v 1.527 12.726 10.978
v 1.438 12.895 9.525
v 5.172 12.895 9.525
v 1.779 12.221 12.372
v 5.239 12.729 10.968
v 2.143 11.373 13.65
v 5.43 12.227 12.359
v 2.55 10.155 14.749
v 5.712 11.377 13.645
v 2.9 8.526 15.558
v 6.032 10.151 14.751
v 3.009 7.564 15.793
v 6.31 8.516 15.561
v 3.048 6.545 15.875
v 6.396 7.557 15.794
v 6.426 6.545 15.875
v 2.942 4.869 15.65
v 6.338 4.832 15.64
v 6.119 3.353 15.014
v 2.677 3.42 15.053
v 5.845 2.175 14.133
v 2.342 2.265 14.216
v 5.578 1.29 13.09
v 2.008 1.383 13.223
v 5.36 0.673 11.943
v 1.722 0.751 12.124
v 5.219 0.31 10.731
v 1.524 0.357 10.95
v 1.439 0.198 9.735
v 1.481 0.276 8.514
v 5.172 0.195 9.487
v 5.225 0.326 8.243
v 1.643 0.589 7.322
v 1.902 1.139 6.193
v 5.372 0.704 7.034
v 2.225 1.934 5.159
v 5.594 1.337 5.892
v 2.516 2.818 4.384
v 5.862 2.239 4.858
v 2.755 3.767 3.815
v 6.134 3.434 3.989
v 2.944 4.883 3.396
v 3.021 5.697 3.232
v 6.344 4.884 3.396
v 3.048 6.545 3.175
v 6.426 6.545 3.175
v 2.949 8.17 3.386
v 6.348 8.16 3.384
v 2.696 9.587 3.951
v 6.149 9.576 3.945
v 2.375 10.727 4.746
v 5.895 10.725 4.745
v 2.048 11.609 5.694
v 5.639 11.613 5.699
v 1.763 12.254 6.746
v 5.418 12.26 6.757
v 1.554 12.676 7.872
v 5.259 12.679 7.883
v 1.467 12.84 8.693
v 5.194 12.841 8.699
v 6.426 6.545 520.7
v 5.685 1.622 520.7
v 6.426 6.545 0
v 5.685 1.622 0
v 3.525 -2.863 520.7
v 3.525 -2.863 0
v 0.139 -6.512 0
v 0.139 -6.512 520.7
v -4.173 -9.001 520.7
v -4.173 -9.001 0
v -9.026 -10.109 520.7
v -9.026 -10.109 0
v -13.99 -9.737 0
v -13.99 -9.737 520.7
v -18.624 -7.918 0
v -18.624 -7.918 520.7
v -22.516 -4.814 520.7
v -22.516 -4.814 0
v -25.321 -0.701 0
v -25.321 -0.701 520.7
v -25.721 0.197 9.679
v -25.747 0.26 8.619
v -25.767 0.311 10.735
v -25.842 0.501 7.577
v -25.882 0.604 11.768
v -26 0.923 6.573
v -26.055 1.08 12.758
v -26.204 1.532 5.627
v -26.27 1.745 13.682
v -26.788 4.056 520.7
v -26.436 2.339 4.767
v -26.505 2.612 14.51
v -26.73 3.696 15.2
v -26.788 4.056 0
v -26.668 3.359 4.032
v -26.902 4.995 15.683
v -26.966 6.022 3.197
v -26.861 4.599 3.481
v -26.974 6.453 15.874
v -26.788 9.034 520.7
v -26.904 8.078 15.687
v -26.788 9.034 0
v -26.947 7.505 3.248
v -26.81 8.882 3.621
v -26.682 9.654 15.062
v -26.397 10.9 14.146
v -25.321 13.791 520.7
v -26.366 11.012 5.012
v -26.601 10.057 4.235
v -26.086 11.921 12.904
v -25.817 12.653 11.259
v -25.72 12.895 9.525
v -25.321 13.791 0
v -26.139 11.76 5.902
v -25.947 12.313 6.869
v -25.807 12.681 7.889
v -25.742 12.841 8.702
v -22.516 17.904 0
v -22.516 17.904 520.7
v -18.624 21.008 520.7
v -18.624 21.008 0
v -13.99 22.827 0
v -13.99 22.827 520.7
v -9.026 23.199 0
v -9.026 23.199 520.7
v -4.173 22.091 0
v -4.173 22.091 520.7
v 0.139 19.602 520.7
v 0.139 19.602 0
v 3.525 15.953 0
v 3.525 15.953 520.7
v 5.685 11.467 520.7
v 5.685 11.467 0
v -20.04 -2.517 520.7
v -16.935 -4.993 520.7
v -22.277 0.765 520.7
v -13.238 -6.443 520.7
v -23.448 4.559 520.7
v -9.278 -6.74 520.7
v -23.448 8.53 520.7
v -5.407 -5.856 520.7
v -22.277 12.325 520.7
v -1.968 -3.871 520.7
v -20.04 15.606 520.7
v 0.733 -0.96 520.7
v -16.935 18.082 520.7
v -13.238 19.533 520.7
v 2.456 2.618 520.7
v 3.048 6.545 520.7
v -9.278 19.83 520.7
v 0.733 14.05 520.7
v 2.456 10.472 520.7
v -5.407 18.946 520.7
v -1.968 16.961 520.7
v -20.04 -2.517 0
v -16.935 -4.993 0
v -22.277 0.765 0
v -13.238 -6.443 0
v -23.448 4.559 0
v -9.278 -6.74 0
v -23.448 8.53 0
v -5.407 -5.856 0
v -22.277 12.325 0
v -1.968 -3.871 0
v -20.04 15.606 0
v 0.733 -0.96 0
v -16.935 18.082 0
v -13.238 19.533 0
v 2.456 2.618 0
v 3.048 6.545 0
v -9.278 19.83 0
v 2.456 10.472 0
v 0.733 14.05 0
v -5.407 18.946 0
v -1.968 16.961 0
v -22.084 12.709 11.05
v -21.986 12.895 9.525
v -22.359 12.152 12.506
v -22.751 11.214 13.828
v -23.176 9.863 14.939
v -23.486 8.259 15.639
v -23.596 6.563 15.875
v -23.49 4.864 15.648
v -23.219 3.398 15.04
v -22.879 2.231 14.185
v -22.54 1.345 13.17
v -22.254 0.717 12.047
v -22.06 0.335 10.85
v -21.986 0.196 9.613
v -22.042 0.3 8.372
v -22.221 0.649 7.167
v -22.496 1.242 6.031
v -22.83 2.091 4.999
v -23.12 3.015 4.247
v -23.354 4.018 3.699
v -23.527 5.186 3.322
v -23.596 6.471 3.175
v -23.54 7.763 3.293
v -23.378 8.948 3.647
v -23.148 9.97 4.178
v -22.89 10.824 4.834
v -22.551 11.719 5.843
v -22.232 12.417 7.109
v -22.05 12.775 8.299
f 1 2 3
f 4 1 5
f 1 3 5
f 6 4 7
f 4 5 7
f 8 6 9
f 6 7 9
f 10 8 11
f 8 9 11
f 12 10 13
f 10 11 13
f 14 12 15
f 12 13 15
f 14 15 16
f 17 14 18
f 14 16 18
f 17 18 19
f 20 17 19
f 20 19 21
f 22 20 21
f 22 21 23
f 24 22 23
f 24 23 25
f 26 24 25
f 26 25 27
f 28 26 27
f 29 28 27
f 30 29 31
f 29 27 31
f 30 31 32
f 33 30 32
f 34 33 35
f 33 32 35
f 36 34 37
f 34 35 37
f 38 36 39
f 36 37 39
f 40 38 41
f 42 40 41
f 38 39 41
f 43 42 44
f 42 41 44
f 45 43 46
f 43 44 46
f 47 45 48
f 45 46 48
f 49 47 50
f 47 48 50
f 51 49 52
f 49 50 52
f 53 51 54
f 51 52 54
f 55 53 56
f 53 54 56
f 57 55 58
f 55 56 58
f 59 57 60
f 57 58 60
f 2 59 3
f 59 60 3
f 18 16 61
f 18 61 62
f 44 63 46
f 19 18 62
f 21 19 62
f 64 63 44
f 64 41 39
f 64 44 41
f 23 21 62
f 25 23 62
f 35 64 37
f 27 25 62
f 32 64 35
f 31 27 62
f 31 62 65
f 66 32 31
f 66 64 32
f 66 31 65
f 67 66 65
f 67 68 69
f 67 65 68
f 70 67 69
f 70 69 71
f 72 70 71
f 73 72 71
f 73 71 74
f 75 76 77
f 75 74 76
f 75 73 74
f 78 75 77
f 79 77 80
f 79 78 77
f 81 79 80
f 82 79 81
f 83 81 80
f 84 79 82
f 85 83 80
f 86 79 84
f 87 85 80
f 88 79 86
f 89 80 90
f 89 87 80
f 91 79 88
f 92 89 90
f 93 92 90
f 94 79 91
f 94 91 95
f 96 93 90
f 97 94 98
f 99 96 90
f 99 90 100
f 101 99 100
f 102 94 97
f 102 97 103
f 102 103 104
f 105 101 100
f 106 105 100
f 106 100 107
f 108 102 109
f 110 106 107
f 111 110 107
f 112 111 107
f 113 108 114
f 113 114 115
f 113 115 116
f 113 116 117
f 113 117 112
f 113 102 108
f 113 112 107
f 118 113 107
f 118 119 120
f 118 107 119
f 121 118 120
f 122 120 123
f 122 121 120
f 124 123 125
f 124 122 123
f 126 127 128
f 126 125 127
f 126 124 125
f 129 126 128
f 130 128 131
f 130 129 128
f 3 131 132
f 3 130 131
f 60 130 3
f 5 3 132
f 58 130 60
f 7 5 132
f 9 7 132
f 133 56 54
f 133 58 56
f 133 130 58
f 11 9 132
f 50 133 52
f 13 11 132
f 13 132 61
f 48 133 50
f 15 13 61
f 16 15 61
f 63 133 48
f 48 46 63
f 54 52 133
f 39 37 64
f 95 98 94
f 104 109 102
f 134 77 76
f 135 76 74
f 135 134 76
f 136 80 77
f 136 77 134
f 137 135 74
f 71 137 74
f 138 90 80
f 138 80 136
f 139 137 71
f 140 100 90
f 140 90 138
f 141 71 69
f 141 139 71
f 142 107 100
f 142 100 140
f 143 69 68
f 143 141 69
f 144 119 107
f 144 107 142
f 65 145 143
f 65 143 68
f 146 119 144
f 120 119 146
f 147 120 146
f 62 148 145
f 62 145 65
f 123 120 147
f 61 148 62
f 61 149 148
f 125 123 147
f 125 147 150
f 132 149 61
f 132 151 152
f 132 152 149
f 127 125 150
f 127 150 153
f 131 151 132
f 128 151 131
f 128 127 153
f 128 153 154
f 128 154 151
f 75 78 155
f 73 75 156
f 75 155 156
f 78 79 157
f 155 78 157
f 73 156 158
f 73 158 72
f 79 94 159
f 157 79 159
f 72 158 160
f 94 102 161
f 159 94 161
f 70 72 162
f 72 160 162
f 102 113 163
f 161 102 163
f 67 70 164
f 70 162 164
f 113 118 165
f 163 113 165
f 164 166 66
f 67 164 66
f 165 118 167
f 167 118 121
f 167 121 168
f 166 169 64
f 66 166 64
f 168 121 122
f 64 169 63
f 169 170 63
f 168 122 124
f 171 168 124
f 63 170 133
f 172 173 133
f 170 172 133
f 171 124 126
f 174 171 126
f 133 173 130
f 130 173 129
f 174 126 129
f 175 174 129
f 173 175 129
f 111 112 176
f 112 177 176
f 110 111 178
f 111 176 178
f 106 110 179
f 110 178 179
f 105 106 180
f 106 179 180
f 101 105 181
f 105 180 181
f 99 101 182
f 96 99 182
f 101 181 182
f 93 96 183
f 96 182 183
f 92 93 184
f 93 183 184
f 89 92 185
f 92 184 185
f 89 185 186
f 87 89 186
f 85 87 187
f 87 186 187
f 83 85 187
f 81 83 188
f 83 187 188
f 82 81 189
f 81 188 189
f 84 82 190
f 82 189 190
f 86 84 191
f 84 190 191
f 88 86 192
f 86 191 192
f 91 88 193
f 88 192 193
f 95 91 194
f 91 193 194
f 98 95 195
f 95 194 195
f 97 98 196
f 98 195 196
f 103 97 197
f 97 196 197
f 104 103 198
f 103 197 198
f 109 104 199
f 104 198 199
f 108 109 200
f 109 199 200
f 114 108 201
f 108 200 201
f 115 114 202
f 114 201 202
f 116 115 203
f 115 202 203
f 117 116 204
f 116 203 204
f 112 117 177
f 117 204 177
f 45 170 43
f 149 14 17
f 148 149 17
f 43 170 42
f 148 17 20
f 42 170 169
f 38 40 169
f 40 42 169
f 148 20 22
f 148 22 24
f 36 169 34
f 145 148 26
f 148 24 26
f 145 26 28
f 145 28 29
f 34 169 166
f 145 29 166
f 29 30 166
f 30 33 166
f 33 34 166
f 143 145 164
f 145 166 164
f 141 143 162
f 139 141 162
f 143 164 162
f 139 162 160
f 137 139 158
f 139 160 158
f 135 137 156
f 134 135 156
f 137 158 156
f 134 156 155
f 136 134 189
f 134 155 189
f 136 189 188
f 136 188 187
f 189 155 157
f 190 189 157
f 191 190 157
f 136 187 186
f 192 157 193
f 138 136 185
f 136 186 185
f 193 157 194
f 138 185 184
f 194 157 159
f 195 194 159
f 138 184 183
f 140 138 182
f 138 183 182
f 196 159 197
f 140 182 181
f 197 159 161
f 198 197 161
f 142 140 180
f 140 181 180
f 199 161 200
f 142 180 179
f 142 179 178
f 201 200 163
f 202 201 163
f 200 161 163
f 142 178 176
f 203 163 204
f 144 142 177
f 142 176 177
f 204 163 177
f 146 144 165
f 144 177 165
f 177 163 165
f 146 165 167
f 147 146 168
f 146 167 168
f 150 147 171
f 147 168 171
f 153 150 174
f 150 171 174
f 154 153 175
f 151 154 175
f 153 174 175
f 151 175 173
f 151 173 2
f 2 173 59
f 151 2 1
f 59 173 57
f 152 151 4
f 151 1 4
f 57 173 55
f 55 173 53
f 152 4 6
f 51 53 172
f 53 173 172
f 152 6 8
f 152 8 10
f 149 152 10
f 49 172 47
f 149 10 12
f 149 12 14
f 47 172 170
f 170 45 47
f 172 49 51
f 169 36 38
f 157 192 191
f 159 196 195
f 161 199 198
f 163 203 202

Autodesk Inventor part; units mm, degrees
ref_plane "XZ Plane" through (0, 0, 0) normal (0, 1, 0) x (-1, 0, 0)
ref_plane "XY Plane" through (0, 0, 0) normal (0, 0, 1) x (1, 0, 0)
sketch "Sketch1" plane through (0, 0, 0) normal (0, 0, 1) x (1, 0, 0)
  circle A0 centre (-10.274, 6.5449) radius 16.7005
  dimension "d0" = 33.401
extrude "Extrusion1" add sketch "Sketch1" along normal blind 520.7
shell "Shell1" thickness 3.3782 removed faces 2 at (-15.0414, 5.2901, 0) at (-15.0414, 5.2901, 520.7)
ref_plane "Work Plane1" through (6.4265, 6.5449, 0) normal (1, 0, 0) x (0, 1, 0)
sketch "Sketch3" plane through (6.4265, 6.5449, 0) normal (1, 0, 0) x (0, 1, 0)
  line L0 (13.3223, 0) -> (-13.3223, 0) projected
  circle A0 centre (0, 9.525) radius 6.35
  dimension "d4" = 12.7
  dimension "d5" = 9.525
extrude "Extrusion2" cut sketch "Sketch3" against normal through all
properties part number "FE-00003-01"
